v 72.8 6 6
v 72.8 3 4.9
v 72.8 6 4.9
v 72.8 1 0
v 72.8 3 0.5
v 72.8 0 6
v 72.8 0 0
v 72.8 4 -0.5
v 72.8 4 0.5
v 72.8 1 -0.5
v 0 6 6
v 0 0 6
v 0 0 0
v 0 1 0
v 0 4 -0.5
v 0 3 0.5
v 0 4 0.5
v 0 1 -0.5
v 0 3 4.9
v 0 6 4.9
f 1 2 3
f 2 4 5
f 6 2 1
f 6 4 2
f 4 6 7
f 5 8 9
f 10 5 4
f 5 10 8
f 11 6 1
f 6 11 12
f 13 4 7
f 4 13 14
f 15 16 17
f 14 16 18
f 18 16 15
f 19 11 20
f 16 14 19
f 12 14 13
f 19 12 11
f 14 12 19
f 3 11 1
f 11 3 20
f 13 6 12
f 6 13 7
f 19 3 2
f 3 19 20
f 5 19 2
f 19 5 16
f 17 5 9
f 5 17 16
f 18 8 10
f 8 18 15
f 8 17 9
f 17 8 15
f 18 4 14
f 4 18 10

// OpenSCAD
WSCR = 73 - .2; // Width of the display's visible part.
MDISP = 3; // Width of the display's margin.
H = 6; // Height of the panel.
TFINGER = 3; // Depth of the groove that locks the panel in place.
WFINGER = 10;
WALL = 1; // Thickness of the walls.

module corner() {
  color("white")
    union() {
      difference() {
        cube([WSCR, H, H]);
        translate([-.1, H - MDISP, -.1])
          cube([WSCR + .2, 10, H - WALL]);
      }
      translate([0, 1, -.5])
        cube([WSCR, 3, 1]);
    }
}

corner();
